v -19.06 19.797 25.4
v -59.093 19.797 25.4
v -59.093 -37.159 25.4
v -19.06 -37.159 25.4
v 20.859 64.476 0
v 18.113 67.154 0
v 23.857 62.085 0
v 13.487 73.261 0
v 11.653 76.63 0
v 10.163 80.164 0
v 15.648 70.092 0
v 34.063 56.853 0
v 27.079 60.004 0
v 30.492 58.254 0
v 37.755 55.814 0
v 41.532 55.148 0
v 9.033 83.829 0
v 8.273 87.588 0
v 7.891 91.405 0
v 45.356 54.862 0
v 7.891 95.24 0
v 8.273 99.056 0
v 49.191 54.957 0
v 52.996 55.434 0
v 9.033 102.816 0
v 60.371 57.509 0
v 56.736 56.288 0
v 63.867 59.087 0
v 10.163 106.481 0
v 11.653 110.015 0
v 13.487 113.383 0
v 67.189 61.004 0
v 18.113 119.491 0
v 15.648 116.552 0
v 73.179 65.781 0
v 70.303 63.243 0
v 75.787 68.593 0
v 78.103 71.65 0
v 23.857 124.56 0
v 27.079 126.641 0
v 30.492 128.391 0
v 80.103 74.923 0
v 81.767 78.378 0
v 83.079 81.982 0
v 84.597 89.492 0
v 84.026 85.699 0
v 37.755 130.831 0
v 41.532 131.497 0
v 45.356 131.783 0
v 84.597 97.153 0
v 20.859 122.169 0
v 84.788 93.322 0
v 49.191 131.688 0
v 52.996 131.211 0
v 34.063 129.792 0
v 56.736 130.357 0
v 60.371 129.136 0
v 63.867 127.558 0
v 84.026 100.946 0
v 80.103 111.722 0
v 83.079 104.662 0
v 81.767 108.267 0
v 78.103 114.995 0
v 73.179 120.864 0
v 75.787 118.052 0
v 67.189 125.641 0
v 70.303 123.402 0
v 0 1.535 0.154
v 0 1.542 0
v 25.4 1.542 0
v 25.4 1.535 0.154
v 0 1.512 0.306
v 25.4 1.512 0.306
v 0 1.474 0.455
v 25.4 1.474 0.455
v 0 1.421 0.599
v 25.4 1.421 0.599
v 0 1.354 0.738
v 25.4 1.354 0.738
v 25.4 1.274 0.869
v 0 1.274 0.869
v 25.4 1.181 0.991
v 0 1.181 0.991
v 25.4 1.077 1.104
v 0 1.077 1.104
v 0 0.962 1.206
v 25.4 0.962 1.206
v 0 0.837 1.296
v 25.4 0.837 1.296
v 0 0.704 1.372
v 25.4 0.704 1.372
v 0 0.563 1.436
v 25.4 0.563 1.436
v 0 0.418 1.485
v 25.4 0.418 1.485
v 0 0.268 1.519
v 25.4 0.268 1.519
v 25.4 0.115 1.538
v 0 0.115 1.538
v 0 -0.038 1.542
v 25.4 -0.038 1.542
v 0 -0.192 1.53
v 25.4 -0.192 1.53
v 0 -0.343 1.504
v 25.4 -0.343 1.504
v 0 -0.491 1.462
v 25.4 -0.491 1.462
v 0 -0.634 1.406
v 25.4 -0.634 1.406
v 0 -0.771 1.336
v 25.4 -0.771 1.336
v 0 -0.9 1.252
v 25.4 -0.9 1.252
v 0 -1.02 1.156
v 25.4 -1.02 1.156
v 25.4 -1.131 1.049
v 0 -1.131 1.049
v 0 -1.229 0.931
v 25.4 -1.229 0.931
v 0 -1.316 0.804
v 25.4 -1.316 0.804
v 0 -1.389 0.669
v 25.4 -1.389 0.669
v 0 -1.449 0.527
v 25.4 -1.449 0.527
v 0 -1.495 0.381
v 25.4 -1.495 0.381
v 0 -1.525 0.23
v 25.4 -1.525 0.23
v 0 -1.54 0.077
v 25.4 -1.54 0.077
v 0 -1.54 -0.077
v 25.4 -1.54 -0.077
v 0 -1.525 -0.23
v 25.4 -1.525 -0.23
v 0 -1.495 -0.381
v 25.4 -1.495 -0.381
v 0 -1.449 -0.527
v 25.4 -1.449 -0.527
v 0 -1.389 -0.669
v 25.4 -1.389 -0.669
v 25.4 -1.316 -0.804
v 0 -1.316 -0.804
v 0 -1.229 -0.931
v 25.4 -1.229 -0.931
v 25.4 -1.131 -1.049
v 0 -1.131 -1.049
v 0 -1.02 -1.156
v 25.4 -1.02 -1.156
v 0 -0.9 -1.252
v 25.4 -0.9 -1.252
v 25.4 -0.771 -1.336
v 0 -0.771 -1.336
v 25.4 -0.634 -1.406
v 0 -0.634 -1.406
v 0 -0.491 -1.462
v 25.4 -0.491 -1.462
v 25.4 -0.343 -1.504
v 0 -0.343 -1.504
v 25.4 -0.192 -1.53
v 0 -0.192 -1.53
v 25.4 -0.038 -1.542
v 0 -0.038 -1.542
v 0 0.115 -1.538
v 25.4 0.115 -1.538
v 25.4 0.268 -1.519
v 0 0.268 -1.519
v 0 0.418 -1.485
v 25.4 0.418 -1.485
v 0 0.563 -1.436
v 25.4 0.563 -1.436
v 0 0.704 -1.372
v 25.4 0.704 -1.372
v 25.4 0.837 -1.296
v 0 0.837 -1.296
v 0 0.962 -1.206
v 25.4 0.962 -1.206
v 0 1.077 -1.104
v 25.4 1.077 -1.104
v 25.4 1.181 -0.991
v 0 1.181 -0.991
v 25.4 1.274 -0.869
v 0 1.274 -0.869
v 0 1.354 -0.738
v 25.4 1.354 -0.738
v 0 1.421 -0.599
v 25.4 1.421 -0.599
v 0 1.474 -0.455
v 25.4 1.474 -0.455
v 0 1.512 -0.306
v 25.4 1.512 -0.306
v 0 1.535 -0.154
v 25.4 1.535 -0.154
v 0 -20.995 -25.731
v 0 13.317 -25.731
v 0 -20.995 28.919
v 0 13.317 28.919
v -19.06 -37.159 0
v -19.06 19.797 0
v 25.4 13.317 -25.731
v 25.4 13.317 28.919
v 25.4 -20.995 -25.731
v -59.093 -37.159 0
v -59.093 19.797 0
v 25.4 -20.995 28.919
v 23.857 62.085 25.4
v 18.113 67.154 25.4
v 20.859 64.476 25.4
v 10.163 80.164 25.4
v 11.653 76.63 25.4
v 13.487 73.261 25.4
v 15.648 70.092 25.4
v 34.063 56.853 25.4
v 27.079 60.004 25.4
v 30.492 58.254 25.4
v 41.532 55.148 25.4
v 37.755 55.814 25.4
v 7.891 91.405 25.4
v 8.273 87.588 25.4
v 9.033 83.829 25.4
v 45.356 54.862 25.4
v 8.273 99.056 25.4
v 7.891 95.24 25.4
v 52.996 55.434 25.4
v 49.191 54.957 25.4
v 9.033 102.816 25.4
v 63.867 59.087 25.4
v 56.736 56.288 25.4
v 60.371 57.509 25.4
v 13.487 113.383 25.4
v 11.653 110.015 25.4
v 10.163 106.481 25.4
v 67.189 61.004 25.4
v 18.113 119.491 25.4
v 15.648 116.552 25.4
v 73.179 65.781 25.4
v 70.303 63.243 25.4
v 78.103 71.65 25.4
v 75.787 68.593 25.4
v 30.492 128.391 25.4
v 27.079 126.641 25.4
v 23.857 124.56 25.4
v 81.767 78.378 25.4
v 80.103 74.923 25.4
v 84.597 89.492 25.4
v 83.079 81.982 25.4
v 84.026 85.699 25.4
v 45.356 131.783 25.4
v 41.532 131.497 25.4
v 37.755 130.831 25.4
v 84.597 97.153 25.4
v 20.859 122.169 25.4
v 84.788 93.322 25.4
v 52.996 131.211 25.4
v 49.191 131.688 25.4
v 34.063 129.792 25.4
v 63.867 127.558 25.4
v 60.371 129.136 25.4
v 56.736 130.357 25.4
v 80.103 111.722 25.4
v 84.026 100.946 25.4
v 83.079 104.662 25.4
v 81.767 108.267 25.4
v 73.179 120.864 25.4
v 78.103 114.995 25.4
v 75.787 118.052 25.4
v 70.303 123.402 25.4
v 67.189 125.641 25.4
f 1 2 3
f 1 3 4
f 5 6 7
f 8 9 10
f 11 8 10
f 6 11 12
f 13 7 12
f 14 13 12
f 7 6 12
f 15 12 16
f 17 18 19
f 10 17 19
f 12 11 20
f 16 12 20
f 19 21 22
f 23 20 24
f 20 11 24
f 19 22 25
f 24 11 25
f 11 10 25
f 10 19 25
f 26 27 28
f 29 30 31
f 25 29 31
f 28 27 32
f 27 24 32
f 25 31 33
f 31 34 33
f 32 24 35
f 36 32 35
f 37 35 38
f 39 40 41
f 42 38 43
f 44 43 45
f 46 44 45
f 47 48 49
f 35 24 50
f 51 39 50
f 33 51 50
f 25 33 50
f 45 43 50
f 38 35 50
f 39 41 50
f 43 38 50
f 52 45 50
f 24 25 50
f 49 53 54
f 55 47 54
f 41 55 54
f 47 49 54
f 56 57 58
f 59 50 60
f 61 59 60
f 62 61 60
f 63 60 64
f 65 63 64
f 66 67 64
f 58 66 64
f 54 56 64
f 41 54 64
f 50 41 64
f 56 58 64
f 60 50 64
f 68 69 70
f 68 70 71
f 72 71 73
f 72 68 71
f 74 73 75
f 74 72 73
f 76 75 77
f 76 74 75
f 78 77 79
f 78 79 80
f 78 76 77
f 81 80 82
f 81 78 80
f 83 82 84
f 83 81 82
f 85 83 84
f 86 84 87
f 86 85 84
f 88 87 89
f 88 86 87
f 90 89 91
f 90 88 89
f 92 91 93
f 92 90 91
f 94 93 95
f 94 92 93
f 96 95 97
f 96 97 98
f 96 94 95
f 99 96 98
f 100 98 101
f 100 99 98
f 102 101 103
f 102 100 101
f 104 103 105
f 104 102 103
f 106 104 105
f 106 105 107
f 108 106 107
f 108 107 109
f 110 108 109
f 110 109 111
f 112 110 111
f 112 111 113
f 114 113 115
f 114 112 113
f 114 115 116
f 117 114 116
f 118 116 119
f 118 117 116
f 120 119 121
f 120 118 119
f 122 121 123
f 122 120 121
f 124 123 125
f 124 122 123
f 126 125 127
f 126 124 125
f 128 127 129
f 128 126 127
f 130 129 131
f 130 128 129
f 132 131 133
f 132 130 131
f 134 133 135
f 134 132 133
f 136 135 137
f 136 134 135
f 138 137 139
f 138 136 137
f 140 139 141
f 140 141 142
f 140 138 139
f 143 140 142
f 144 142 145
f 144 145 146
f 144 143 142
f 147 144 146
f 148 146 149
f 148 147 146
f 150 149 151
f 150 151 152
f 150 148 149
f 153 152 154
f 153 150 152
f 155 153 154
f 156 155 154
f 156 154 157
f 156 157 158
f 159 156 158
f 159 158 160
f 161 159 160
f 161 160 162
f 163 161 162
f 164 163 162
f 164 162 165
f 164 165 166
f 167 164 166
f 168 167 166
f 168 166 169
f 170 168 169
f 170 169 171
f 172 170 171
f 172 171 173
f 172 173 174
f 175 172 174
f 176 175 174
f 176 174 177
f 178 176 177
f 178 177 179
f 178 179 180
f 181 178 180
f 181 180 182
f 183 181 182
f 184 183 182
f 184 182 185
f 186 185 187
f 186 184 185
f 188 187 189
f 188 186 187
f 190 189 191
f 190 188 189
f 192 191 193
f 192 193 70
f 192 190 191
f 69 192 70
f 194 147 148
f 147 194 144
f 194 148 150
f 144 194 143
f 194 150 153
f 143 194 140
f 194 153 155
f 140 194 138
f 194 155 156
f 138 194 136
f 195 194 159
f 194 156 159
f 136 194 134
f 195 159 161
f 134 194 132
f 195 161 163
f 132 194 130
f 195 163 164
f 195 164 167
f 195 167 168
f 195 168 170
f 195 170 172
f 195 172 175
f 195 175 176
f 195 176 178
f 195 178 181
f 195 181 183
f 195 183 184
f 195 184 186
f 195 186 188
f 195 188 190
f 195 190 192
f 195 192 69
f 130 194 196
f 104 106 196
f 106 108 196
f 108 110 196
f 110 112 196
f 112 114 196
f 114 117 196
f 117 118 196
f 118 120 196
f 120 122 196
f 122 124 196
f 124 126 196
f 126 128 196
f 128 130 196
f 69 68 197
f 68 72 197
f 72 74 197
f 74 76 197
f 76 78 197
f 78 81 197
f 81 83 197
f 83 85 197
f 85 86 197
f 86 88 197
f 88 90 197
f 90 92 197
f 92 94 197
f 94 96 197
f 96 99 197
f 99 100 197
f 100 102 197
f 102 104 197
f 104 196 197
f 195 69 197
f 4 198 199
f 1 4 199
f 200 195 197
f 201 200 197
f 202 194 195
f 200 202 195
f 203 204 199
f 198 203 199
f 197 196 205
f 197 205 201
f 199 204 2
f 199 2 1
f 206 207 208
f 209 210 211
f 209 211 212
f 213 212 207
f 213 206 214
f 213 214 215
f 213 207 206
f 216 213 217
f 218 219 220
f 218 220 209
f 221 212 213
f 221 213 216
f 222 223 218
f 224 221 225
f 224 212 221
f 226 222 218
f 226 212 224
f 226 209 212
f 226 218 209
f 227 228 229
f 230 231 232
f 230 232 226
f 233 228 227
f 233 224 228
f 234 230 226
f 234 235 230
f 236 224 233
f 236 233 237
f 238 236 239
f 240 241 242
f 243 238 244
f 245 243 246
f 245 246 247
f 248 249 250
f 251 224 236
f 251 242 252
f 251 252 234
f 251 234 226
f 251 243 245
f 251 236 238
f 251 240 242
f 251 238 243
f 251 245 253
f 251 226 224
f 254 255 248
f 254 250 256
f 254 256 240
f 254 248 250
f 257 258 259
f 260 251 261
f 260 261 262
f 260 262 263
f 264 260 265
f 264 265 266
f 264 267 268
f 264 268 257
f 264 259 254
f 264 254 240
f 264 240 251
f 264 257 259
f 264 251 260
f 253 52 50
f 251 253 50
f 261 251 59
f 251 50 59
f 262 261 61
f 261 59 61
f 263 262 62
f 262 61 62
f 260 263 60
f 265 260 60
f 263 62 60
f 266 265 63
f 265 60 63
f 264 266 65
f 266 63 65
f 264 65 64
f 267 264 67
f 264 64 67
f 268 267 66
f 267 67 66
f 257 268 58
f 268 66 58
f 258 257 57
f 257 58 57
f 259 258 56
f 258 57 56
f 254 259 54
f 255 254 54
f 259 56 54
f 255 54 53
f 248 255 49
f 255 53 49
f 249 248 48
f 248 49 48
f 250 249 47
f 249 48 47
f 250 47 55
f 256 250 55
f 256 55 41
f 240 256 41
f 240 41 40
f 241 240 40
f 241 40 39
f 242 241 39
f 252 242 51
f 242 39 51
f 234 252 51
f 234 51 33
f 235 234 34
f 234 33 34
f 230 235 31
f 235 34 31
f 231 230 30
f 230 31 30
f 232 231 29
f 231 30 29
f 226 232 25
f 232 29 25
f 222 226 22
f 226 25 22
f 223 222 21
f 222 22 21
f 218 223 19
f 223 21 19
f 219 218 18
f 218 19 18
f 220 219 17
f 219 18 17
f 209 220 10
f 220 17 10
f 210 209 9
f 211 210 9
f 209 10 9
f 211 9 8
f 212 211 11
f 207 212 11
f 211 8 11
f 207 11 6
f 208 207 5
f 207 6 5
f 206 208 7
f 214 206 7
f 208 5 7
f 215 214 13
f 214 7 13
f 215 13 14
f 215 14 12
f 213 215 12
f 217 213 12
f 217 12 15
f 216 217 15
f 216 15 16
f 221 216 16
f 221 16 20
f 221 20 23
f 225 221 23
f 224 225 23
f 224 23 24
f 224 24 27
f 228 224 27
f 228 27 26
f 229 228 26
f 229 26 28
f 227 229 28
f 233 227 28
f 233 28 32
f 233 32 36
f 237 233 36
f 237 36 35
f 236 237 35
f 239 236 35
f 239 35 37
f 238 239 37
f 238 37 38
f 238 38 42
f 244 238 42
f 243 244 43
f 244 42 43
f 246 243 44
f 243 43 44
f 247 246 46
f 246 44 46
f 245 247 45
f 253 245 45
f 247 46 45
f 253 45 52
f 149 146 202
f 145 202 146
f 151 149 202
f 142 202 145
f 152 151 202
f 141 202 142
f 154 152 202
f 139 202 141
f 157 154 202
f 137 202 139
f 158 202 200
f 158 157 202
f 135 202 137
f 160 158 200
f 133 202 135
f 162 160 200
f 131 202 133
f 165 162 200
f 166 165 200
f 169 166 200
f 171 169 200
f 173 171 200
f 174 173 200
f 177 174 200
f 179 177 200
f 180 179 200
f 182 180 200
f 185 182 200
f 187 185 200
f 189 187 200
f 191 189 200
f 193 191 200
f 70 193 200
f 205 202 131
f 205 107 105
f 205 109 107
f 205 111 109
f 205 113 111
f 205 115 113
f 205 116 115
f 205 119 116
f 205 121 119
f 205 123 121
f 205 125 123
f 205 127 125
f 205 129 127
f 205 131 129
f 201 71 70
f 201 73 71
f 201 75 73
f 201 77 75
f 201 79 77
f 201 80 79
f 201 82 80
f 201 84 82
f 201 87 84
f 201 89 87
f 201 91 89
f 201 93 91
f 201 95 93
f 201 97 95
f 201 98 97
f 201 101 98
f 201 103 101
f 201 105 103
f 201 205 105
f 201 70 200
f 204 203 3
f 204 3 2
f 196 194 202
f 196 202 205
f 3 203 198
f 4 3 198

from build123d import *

# Parameters (mm, degrees)
F0_W     = 34.312252
F0_H     = 54.650113
F0_R     = 1.542217
F1_DEPTH = 25.4
F2_W     = 40.033057
F2_H     = 56.956679
F3_DEPTH = 25.4
F5_R     = 38.472751
F6_DEPTH = 25.4


with BuildPart() as f1:
    # F0 (on Right) → F1 (new body)
    with BuildSketch(Plane.YZ):
        with Locations((-3.838928, 1.594358)):
            Rectangle(F0_W, F0_H)
        Circle(F0_R, mode=Mode.SUBTRACT)
    extrude(amount=F1_DEPTH)


with BuildPart() as f3:
    # F2 (on Top) → F3 (new body)
    with BuildSketch(Plane.XY):
        with Locations((-39.076581, -8.680982)):
            Rectangle(F2_W, F2_H)
    extrude(amount=F3_DEPTH)


with BuildPart() as f6:
    # F5 (on face) → F6 (new body)
    with BuildSketch(Plane.XY):
        with Locations((46.315636, 93.322419)):
            Circle(F5_R)
    extrude(amount=F6_DEPTH)


solid = Compound([f1.part, f3.part, f6.part])
